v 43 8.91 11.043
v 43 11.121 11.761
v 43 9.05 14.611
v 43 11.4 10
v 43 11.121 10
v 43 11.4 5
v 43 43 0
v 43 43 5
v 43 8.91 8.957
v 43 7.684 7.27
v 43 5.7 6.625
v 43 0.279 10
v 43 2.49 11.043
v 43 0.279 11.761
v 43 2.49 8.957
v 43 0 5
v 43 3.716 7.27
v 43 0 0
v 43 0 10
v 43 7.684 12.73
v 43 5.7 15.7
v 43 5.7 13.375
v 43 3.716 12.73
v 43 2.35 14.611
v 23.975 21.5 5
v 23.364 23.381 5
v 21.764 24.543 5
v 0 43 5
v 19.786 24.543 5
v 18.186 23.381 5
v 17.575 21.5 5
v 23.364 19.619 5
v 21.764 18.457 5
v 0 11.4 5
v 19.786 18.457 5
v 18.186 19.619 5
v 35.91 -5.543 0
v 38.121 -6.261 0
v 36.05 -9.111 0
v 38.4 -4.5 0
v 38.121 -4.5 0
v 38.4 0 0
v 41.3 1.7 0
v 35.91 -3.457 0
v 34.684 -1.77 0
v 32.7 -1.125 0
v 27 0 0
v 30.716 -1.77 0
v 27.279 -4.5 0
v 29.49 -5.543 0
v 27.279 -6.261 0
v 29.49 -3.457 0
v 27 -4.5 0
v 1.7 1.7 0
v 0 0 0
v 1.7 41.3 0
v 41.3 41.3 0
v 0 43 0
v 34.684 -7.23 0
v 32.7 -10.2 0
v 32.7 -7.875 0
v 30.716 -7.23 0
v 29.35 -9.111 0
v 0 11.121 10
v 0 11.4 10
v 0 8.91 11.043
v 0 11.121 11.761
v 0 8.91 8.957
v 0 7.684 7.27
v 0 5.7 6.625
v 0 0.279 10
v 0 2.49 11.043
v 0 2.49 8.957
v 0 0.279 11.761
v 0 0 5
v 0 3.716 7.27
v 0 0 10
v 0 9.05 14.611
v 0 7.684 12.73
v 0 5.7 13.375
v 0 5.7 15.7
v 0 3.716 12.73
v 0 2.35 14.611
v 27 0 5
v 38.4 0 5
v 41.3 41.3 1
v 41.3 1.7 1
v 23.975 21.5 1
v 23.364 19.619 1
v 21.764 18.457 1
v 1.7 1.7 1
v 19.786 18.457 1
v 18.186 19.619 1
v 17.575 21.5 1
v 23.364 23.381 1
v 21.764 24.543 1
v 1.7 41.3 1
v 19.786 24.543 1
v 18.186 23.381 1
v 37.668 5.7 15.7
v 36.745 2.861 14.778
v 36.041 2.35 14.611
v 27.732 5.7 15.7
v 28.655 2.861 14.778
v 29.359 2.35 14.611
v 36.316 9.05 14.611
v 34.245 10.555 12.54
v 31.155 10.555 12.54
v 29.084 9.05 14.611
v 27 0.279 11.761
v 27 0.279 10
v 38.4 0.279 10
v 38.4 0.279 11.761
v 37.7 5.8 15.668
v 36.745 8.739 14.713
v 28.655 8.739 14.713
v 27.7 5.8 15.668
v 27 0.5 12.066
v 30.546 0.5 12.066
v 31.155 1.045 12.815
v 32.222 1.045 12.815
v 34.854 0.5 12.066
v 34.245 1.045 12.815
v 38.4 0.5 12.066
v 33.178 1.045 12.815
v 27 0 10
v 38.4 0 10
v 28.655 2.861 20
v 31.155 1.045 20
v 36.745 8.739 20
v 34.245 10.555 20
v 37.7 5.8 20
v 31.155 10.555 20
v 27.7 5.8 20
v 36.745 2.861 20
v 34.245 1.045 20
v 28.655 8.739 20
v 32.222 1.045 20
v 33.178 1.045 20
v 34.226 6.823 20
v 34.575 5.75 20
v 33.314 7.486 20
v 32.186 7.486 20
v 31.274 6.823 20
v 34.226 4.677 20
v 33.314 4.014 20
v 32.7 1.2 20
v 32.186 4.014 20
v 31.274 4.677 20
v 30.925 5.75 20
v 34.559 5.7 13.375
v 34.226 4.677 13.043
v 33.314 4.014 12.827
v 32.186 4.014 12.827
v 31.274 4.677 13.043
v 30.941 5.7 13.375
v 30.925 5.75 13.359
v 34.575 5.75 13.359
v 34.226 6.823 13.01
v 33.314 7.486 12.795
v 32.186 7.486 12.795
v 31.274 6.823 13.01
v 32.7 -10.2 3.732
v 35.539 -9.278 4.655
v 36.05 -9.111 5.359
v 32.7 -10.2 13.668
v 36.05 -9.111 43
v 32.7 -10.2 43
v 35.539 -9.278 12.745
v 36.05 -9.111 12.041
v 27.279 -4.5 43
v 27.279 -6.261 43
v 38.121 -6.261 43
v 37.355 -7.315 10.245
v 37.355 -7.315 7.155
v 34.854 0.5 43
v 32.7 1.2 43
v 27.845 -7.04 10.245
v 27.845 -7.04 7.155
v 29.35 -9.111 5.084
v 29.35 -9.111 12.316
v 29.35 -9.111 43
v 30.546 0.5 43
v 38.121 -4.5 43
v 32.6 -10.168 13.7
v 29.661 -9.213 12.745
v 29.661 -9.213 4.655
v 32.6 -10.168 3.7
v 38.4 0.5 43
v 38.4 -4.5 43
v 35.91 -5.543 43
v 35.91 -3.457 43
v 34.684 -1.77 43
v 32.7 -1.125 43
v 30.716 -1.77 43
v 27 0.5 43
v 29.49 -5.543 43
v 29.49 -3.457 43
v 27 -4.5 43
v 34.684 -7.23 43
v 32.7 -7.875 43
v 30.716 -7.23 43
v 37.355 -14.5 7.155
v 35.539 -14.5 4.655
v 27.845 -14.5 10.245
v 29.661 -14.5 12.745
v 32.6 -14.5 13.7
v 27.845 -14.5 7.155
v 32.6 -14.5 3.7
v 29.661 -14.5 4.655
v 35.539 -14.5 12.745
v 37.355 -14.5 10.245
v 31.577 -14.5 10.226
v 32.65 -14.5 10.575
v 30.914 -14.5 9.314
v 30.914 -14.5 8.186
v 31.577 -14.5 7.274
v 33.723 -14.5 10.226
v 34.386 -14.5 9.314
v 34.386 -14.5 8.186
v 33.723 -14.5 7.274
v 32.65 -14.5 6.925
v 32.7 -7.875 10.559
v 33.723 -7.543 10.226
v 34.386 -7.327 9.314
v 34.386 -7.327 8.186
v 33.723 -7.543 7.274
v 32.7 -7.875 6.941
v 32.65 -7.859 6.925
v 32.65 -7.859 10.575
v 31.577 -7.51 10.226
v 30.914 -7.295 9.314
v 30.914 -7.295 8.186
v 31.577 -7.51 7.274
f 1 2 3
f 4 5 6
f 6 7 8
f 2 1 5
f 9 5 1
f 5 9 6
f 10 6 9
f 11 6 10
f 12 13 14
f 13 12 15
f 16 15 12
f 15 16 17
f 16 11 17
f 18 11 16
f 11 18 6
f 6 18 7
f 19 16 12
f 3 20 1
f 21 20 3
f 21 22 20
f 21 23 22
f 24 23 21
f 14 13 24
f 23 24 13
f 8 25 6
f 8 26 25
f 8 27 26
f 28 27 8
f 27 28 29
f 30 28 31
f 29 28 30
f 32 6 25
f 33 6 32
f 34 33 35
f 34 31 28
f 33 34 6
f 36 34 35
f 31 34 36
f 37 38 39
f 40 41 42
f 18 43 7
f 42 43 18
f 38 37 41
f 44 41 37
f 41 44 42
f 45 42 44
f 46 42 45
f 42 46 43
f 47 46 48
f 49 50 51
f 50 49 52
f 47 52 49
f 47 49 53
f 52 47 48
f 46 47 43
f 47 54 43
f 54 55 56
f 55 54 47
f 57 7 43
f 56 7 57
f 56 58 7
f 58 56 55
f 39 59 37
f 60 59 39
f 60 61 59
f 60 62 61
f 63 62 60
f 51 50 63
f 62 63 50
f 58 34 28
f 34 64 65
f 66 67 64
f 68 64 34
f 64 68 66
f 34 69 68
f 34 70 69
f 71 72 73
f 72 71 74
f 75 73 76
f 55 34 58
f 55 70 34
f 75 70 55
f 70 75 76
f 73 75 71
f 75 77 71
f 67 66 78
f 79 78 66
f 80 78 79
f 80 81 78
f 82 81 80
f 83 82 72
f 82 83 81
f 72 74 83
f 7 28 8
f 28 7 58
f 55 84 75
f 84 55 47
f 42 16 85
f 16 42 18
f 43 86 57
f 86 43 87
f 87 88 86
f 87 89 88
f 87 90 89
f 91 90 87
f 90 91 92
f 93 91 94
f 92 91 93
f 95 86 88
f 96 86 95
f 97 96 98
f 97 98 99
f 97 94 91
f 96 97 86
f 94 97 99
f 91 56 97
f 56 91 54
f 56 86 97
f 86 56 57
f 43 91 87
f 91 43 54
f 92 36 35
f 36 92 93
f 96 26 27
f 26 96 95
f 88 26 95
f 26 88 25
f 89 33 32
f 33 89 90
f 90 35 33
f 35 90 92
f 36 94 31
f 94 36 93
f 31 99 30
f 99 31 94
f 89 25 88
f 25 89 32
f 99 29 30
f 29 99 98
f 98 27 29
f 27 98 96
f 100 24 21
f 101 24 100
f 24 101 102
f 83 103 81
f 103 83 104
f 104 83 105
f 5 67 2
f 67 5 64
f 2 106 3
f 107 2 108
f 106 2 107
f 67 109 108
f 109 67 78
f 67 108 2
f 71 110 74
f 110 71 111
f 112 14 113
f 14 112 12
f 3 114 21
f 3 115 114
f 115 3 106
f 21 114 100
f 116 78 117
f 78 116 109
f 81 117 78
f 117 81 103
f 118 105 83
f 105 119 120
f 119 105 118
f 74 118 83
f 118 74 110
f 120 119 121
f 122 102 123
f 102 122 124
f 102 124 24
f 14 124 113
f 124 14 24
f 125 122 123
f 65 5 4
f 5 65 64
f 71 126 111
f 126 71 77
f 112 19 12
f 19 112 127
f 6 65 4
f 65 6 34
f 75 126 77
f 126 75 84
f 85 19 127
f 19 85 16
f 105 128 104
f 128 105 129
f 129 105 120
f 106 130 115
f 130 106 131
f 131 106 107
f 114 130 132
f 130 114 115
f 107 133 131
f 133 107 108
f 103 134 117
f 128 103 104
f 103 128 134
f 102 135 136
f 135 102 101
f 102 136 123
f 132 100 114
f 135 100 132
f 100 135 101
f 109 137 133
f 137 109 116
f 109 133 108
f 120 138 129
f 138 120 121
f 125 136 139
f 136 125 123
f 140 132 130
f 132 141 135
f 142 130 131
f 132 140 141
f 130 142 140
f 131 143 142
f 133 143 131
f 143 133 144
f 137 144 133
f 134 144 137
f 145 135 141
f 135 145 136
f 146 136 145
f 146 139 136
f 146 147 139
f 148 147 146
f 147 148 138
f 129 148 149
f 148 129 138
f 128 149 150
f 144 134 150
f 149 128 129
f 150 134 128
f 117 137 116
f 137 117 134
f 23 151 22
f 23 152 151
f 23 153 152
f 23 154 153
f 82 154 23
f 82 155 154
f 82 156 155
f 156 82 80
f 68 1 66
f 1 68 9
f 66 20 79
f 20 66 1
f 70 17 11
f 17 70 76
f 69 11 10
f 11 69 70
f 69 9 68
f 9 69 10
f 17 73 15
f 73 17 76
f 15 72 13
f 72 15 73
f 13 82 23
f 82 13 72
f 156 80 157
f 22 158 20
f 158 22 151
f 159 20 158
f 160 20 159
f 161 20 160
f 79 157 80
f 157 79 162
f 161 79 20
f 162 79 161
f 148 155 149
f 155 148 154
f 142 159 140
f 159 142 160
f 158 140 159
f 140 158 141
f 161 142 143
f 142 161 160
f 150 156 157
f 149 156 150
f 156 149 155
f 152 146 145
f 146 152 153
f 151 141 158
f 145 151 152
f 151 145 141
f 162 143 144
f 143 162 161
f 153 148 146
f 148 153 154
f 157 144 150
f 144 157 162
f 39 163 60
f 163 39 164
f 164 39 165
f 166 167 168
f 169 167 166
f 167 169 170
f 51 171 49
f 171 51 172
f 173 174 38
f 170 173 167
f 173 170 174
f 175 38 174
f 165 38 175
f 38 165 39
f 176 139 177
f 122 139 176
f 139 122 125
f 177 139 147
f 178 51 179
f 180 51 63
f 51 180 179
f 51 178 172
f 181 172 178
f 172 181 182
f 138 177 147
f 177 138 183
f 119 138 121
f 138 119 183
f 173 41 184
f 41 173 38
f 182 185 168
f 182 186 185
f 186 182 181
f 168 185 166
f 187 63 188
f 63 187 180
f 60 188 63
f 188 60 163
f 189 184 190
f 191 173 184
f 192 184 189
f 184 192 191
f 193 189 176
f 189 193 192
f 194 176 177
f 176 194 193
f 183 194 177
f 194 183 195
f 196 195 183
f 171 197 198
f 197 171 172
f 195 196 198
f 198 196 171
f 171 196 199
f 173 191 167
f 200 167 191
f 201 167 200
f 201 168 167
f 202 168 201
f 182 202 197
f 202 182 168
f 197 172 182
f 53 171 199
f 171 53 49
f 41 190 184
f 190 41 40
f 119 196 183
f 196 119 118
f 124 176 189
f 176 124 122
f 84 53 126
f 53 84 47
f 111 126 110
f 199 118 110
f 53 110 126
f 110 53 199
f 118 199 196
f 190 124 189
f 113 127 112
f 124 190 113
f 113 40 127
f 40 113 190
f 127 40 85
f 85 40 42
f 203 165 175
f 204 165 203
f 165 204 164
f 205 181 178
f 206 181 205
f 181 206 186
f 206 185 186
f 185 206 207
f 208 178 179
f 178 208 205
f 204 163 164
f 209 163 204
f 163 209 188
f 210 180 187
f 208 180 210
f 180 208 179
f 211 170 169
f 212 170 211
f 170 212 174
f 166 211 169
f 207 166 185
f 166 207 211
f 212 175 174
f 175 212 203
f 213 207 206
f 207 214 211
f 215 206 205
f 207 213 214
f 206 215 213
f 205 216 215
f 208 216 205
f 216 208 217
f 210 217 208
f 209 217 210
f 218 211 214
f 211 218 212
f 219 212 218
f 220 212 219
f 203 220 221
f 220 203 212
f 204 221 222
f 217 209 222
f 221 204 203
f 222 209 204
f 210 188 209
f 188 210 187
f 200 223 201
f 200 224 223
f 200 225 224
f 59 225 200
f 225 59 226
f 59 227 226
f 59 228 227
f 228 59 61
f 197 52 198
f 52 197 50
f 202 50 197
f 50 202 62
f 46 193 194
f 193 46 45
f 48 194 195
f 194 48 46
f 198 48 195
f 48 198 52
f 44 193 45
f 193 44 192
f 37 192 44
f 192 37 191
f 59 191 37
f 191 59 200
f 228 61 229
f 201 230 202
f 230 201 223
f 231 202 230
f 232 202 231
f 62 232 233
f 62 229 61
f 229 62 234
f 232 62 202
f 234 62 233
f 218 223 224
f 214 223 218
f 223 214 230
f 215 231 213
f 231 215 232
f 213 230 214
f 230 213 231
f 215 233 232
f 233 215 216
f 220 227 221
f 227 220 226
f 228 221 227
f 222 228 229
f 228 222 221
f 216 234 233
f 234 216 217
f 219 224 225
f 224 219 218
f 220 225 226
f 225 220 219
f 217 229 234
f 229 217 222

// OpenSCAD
aa=13.2;
rr=1; //raio parafuso fixação offset
sss=12;
res=10;
difference(){
    translate([0,0,0])cube([39+4,39+4,5]);
    #translate([2-0.3,2-0.3,-4])cube([39+0.6,39+0.6,5]);    
    #translate([(37.55+4)/2,(39+4)/2,-9])cylinder(5+9,6.4/2,6.4/2,$fn=res);
}

difference(){
    translate([0,-aa,0])
        {    
        translate([0,16.35+5.1/2,10])rotate([0,90,0])cylinder(39+4,6.4/2+0.5+2,6.4/2+0.5+2,$fn=res);
        translate([0,16.35+5.1/2-6.4/2-0.5-2,5])cube([39+4,7.4+4,5]);
        translate([20.7+sss,19,10]) cylinder(10,5,5,$fn=res);        
        }
    
    #translate([0,16.35+5.1/2-aa,10])rotate([0,90,0])cylinder(39+4,6.35/2+0.2,6.35/2+0.2,$fn=res);
    #translate([sss+(39+4)/2-0.75,(39+4)/2-15-0.75,10])cylinder(10,3.65/2,3.65/2,$fn=res);    
};
translate([3.2*sss,5.5,0])rotate([0,0,90])rotate([0,-90,0]){
    difference(){
        translate([0,-aa,0])
            {    
            translate([0,16.35+5.1/2,10])rotate([0,90,0])cylinder(39+4,6.4/2+0.5+2,6.4/2+0.5+2,$fn=res);
            translate([0,16.35+5.1/2-6.4/2-0.5-2,5])cube([39+4,7.4+4,5]);
            translate([20.7-sss,19,10]) cylinder(10,5,5,$fn=res);        
            }
        
        #translate([0,16.35+5.1/2-aa,10])rotate([0,90,0])cylinder(39+4,6.35/2+0.2,6.35/2+0.2,$fn=res);
        #translate([-sss+(39+4)/2-0.75,(39+4)/2-15-0.75,10])cylinder(10,3.65/2,3.65/2,$fn=res);    
    };
}
